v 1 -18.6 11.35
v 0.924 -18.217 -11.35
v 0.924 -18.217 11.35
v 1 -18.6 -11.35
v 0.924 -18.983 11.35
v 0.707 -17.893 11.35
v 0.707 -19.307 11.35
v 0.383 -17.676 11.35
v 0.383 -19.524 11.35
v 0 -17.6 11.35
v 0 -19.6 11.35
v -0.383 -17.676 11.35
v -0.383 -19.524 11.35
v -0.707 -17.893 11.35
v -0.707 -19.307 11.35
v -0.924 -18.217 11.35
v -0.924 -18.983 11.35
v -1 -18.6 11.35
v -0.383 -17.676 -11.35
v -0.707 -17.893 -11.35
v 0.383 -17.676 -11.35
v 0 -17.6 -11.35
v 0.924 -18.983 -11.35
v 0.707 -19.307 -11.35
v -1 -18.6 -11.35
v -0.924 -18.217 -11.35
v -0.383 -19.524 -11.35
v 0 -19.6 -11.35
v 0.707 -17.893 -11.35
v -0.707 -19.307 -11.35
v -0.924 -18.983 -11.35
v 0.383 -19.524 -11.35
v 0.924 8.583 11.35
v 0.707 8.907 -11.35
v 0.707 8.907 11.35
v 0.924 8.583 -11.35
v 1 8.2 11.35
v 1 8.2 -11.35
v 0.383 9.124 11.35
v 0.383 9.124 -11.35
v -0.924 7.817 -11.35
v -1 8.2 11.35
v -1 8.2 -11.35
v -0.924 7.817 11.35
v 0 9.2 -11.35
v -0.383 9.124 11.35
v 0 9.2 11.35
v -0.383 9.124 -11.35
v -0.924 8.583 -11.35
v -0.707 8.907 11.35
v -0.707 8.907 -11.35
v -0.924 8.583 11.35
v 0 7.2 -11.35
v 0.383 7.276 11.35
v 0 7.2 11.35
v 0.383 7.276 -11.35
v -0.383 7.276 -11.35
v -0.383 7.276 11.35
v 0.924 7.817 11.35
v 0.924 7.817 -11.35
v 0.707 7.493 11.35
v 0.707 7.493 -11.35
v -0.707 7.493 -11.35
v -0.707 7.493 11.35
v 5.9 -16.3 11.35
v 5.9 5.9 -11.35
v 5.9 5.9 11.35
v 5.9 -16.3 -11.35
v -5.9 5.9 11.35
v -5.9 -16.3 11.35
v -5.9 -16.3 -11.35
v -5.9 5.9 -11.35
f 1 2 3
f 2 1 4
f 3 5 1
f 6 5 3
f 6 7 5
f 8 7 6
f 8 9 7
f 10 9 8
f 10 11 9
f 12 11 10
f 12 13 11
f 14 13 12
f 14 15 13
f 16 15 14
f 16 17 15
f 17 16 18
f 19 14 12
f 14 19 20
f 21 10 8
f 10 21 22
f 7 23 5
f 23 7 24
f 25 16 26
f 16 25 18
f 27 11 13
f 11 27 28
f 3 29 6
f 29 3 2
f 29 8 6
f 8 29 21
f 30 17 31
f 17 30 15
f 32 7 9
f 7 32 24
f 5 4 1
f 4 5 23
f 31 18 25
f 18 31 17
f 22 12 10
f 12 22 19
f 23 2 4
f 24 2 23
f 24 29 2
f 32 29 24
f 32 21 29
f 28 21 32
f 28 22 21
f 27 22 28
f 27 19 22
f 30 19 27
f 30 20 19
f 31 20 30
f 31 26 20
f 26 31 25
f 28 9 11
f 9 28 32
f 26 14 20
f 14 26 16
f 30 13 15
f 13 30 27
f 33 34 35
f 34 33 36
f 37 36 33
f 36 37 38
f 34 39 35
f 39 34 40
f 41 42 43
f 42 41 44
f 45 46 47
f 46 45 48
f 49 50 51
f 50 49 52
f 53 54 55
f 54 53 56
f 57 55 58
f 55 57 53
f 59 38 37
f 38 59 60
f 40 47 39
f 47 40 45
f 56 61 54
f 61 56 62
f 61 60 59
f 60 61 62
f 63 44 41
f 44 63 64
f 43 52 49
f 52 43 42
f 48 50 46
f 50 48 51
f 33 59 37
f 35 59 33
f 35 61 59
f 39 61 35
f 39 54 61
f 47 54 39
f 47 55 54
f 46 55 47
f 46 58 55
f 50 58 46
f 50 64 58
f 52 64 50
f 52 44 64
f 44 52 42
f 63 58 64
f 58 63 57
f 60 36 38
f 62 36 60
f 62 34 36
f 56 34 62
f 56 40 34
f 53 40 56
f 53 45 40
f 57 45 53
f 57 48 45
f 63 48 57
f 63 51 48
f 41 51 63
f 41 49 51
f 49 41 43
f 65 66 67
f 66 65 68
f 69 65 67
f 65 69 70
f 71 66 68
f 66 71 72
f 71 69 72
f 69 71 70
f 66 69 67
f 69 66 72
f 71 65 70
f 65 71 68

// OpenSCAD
servoEnvelope();

// Enveloppe for servo holes fixations
// Around the servo motor and the fixation holes

module servoEnvelope(
    servo_hole_scale = 1,
    screw_hole_diameter = 2
) {

    servo_length = 22.2;
    servo_width = 11.8;
    servo_height = 22.7;

    // translating to center the servo motor envelope as servo
    scale(servo_hole_scale)
        translate([-servo_width / 2, - servo_length + (servo_width / 2), -servo_height/2])
            cube([servo_width, servo_length, servo_height], center = false);    

    
    translate([-servo_width / 2, - servo_length + (servo_width / 2), -servo_height/2]) {
        translate([servo_width / 2, - 2.3, 0])
            cylinder(h = servo_height, r = 1, center = false, $fn = 16);

        translate([servo_width / 2, servo_length + 2.3, 0])
            cylinder(h = servo_height, r = 1, center = false, $fn = 16);
    }
}
